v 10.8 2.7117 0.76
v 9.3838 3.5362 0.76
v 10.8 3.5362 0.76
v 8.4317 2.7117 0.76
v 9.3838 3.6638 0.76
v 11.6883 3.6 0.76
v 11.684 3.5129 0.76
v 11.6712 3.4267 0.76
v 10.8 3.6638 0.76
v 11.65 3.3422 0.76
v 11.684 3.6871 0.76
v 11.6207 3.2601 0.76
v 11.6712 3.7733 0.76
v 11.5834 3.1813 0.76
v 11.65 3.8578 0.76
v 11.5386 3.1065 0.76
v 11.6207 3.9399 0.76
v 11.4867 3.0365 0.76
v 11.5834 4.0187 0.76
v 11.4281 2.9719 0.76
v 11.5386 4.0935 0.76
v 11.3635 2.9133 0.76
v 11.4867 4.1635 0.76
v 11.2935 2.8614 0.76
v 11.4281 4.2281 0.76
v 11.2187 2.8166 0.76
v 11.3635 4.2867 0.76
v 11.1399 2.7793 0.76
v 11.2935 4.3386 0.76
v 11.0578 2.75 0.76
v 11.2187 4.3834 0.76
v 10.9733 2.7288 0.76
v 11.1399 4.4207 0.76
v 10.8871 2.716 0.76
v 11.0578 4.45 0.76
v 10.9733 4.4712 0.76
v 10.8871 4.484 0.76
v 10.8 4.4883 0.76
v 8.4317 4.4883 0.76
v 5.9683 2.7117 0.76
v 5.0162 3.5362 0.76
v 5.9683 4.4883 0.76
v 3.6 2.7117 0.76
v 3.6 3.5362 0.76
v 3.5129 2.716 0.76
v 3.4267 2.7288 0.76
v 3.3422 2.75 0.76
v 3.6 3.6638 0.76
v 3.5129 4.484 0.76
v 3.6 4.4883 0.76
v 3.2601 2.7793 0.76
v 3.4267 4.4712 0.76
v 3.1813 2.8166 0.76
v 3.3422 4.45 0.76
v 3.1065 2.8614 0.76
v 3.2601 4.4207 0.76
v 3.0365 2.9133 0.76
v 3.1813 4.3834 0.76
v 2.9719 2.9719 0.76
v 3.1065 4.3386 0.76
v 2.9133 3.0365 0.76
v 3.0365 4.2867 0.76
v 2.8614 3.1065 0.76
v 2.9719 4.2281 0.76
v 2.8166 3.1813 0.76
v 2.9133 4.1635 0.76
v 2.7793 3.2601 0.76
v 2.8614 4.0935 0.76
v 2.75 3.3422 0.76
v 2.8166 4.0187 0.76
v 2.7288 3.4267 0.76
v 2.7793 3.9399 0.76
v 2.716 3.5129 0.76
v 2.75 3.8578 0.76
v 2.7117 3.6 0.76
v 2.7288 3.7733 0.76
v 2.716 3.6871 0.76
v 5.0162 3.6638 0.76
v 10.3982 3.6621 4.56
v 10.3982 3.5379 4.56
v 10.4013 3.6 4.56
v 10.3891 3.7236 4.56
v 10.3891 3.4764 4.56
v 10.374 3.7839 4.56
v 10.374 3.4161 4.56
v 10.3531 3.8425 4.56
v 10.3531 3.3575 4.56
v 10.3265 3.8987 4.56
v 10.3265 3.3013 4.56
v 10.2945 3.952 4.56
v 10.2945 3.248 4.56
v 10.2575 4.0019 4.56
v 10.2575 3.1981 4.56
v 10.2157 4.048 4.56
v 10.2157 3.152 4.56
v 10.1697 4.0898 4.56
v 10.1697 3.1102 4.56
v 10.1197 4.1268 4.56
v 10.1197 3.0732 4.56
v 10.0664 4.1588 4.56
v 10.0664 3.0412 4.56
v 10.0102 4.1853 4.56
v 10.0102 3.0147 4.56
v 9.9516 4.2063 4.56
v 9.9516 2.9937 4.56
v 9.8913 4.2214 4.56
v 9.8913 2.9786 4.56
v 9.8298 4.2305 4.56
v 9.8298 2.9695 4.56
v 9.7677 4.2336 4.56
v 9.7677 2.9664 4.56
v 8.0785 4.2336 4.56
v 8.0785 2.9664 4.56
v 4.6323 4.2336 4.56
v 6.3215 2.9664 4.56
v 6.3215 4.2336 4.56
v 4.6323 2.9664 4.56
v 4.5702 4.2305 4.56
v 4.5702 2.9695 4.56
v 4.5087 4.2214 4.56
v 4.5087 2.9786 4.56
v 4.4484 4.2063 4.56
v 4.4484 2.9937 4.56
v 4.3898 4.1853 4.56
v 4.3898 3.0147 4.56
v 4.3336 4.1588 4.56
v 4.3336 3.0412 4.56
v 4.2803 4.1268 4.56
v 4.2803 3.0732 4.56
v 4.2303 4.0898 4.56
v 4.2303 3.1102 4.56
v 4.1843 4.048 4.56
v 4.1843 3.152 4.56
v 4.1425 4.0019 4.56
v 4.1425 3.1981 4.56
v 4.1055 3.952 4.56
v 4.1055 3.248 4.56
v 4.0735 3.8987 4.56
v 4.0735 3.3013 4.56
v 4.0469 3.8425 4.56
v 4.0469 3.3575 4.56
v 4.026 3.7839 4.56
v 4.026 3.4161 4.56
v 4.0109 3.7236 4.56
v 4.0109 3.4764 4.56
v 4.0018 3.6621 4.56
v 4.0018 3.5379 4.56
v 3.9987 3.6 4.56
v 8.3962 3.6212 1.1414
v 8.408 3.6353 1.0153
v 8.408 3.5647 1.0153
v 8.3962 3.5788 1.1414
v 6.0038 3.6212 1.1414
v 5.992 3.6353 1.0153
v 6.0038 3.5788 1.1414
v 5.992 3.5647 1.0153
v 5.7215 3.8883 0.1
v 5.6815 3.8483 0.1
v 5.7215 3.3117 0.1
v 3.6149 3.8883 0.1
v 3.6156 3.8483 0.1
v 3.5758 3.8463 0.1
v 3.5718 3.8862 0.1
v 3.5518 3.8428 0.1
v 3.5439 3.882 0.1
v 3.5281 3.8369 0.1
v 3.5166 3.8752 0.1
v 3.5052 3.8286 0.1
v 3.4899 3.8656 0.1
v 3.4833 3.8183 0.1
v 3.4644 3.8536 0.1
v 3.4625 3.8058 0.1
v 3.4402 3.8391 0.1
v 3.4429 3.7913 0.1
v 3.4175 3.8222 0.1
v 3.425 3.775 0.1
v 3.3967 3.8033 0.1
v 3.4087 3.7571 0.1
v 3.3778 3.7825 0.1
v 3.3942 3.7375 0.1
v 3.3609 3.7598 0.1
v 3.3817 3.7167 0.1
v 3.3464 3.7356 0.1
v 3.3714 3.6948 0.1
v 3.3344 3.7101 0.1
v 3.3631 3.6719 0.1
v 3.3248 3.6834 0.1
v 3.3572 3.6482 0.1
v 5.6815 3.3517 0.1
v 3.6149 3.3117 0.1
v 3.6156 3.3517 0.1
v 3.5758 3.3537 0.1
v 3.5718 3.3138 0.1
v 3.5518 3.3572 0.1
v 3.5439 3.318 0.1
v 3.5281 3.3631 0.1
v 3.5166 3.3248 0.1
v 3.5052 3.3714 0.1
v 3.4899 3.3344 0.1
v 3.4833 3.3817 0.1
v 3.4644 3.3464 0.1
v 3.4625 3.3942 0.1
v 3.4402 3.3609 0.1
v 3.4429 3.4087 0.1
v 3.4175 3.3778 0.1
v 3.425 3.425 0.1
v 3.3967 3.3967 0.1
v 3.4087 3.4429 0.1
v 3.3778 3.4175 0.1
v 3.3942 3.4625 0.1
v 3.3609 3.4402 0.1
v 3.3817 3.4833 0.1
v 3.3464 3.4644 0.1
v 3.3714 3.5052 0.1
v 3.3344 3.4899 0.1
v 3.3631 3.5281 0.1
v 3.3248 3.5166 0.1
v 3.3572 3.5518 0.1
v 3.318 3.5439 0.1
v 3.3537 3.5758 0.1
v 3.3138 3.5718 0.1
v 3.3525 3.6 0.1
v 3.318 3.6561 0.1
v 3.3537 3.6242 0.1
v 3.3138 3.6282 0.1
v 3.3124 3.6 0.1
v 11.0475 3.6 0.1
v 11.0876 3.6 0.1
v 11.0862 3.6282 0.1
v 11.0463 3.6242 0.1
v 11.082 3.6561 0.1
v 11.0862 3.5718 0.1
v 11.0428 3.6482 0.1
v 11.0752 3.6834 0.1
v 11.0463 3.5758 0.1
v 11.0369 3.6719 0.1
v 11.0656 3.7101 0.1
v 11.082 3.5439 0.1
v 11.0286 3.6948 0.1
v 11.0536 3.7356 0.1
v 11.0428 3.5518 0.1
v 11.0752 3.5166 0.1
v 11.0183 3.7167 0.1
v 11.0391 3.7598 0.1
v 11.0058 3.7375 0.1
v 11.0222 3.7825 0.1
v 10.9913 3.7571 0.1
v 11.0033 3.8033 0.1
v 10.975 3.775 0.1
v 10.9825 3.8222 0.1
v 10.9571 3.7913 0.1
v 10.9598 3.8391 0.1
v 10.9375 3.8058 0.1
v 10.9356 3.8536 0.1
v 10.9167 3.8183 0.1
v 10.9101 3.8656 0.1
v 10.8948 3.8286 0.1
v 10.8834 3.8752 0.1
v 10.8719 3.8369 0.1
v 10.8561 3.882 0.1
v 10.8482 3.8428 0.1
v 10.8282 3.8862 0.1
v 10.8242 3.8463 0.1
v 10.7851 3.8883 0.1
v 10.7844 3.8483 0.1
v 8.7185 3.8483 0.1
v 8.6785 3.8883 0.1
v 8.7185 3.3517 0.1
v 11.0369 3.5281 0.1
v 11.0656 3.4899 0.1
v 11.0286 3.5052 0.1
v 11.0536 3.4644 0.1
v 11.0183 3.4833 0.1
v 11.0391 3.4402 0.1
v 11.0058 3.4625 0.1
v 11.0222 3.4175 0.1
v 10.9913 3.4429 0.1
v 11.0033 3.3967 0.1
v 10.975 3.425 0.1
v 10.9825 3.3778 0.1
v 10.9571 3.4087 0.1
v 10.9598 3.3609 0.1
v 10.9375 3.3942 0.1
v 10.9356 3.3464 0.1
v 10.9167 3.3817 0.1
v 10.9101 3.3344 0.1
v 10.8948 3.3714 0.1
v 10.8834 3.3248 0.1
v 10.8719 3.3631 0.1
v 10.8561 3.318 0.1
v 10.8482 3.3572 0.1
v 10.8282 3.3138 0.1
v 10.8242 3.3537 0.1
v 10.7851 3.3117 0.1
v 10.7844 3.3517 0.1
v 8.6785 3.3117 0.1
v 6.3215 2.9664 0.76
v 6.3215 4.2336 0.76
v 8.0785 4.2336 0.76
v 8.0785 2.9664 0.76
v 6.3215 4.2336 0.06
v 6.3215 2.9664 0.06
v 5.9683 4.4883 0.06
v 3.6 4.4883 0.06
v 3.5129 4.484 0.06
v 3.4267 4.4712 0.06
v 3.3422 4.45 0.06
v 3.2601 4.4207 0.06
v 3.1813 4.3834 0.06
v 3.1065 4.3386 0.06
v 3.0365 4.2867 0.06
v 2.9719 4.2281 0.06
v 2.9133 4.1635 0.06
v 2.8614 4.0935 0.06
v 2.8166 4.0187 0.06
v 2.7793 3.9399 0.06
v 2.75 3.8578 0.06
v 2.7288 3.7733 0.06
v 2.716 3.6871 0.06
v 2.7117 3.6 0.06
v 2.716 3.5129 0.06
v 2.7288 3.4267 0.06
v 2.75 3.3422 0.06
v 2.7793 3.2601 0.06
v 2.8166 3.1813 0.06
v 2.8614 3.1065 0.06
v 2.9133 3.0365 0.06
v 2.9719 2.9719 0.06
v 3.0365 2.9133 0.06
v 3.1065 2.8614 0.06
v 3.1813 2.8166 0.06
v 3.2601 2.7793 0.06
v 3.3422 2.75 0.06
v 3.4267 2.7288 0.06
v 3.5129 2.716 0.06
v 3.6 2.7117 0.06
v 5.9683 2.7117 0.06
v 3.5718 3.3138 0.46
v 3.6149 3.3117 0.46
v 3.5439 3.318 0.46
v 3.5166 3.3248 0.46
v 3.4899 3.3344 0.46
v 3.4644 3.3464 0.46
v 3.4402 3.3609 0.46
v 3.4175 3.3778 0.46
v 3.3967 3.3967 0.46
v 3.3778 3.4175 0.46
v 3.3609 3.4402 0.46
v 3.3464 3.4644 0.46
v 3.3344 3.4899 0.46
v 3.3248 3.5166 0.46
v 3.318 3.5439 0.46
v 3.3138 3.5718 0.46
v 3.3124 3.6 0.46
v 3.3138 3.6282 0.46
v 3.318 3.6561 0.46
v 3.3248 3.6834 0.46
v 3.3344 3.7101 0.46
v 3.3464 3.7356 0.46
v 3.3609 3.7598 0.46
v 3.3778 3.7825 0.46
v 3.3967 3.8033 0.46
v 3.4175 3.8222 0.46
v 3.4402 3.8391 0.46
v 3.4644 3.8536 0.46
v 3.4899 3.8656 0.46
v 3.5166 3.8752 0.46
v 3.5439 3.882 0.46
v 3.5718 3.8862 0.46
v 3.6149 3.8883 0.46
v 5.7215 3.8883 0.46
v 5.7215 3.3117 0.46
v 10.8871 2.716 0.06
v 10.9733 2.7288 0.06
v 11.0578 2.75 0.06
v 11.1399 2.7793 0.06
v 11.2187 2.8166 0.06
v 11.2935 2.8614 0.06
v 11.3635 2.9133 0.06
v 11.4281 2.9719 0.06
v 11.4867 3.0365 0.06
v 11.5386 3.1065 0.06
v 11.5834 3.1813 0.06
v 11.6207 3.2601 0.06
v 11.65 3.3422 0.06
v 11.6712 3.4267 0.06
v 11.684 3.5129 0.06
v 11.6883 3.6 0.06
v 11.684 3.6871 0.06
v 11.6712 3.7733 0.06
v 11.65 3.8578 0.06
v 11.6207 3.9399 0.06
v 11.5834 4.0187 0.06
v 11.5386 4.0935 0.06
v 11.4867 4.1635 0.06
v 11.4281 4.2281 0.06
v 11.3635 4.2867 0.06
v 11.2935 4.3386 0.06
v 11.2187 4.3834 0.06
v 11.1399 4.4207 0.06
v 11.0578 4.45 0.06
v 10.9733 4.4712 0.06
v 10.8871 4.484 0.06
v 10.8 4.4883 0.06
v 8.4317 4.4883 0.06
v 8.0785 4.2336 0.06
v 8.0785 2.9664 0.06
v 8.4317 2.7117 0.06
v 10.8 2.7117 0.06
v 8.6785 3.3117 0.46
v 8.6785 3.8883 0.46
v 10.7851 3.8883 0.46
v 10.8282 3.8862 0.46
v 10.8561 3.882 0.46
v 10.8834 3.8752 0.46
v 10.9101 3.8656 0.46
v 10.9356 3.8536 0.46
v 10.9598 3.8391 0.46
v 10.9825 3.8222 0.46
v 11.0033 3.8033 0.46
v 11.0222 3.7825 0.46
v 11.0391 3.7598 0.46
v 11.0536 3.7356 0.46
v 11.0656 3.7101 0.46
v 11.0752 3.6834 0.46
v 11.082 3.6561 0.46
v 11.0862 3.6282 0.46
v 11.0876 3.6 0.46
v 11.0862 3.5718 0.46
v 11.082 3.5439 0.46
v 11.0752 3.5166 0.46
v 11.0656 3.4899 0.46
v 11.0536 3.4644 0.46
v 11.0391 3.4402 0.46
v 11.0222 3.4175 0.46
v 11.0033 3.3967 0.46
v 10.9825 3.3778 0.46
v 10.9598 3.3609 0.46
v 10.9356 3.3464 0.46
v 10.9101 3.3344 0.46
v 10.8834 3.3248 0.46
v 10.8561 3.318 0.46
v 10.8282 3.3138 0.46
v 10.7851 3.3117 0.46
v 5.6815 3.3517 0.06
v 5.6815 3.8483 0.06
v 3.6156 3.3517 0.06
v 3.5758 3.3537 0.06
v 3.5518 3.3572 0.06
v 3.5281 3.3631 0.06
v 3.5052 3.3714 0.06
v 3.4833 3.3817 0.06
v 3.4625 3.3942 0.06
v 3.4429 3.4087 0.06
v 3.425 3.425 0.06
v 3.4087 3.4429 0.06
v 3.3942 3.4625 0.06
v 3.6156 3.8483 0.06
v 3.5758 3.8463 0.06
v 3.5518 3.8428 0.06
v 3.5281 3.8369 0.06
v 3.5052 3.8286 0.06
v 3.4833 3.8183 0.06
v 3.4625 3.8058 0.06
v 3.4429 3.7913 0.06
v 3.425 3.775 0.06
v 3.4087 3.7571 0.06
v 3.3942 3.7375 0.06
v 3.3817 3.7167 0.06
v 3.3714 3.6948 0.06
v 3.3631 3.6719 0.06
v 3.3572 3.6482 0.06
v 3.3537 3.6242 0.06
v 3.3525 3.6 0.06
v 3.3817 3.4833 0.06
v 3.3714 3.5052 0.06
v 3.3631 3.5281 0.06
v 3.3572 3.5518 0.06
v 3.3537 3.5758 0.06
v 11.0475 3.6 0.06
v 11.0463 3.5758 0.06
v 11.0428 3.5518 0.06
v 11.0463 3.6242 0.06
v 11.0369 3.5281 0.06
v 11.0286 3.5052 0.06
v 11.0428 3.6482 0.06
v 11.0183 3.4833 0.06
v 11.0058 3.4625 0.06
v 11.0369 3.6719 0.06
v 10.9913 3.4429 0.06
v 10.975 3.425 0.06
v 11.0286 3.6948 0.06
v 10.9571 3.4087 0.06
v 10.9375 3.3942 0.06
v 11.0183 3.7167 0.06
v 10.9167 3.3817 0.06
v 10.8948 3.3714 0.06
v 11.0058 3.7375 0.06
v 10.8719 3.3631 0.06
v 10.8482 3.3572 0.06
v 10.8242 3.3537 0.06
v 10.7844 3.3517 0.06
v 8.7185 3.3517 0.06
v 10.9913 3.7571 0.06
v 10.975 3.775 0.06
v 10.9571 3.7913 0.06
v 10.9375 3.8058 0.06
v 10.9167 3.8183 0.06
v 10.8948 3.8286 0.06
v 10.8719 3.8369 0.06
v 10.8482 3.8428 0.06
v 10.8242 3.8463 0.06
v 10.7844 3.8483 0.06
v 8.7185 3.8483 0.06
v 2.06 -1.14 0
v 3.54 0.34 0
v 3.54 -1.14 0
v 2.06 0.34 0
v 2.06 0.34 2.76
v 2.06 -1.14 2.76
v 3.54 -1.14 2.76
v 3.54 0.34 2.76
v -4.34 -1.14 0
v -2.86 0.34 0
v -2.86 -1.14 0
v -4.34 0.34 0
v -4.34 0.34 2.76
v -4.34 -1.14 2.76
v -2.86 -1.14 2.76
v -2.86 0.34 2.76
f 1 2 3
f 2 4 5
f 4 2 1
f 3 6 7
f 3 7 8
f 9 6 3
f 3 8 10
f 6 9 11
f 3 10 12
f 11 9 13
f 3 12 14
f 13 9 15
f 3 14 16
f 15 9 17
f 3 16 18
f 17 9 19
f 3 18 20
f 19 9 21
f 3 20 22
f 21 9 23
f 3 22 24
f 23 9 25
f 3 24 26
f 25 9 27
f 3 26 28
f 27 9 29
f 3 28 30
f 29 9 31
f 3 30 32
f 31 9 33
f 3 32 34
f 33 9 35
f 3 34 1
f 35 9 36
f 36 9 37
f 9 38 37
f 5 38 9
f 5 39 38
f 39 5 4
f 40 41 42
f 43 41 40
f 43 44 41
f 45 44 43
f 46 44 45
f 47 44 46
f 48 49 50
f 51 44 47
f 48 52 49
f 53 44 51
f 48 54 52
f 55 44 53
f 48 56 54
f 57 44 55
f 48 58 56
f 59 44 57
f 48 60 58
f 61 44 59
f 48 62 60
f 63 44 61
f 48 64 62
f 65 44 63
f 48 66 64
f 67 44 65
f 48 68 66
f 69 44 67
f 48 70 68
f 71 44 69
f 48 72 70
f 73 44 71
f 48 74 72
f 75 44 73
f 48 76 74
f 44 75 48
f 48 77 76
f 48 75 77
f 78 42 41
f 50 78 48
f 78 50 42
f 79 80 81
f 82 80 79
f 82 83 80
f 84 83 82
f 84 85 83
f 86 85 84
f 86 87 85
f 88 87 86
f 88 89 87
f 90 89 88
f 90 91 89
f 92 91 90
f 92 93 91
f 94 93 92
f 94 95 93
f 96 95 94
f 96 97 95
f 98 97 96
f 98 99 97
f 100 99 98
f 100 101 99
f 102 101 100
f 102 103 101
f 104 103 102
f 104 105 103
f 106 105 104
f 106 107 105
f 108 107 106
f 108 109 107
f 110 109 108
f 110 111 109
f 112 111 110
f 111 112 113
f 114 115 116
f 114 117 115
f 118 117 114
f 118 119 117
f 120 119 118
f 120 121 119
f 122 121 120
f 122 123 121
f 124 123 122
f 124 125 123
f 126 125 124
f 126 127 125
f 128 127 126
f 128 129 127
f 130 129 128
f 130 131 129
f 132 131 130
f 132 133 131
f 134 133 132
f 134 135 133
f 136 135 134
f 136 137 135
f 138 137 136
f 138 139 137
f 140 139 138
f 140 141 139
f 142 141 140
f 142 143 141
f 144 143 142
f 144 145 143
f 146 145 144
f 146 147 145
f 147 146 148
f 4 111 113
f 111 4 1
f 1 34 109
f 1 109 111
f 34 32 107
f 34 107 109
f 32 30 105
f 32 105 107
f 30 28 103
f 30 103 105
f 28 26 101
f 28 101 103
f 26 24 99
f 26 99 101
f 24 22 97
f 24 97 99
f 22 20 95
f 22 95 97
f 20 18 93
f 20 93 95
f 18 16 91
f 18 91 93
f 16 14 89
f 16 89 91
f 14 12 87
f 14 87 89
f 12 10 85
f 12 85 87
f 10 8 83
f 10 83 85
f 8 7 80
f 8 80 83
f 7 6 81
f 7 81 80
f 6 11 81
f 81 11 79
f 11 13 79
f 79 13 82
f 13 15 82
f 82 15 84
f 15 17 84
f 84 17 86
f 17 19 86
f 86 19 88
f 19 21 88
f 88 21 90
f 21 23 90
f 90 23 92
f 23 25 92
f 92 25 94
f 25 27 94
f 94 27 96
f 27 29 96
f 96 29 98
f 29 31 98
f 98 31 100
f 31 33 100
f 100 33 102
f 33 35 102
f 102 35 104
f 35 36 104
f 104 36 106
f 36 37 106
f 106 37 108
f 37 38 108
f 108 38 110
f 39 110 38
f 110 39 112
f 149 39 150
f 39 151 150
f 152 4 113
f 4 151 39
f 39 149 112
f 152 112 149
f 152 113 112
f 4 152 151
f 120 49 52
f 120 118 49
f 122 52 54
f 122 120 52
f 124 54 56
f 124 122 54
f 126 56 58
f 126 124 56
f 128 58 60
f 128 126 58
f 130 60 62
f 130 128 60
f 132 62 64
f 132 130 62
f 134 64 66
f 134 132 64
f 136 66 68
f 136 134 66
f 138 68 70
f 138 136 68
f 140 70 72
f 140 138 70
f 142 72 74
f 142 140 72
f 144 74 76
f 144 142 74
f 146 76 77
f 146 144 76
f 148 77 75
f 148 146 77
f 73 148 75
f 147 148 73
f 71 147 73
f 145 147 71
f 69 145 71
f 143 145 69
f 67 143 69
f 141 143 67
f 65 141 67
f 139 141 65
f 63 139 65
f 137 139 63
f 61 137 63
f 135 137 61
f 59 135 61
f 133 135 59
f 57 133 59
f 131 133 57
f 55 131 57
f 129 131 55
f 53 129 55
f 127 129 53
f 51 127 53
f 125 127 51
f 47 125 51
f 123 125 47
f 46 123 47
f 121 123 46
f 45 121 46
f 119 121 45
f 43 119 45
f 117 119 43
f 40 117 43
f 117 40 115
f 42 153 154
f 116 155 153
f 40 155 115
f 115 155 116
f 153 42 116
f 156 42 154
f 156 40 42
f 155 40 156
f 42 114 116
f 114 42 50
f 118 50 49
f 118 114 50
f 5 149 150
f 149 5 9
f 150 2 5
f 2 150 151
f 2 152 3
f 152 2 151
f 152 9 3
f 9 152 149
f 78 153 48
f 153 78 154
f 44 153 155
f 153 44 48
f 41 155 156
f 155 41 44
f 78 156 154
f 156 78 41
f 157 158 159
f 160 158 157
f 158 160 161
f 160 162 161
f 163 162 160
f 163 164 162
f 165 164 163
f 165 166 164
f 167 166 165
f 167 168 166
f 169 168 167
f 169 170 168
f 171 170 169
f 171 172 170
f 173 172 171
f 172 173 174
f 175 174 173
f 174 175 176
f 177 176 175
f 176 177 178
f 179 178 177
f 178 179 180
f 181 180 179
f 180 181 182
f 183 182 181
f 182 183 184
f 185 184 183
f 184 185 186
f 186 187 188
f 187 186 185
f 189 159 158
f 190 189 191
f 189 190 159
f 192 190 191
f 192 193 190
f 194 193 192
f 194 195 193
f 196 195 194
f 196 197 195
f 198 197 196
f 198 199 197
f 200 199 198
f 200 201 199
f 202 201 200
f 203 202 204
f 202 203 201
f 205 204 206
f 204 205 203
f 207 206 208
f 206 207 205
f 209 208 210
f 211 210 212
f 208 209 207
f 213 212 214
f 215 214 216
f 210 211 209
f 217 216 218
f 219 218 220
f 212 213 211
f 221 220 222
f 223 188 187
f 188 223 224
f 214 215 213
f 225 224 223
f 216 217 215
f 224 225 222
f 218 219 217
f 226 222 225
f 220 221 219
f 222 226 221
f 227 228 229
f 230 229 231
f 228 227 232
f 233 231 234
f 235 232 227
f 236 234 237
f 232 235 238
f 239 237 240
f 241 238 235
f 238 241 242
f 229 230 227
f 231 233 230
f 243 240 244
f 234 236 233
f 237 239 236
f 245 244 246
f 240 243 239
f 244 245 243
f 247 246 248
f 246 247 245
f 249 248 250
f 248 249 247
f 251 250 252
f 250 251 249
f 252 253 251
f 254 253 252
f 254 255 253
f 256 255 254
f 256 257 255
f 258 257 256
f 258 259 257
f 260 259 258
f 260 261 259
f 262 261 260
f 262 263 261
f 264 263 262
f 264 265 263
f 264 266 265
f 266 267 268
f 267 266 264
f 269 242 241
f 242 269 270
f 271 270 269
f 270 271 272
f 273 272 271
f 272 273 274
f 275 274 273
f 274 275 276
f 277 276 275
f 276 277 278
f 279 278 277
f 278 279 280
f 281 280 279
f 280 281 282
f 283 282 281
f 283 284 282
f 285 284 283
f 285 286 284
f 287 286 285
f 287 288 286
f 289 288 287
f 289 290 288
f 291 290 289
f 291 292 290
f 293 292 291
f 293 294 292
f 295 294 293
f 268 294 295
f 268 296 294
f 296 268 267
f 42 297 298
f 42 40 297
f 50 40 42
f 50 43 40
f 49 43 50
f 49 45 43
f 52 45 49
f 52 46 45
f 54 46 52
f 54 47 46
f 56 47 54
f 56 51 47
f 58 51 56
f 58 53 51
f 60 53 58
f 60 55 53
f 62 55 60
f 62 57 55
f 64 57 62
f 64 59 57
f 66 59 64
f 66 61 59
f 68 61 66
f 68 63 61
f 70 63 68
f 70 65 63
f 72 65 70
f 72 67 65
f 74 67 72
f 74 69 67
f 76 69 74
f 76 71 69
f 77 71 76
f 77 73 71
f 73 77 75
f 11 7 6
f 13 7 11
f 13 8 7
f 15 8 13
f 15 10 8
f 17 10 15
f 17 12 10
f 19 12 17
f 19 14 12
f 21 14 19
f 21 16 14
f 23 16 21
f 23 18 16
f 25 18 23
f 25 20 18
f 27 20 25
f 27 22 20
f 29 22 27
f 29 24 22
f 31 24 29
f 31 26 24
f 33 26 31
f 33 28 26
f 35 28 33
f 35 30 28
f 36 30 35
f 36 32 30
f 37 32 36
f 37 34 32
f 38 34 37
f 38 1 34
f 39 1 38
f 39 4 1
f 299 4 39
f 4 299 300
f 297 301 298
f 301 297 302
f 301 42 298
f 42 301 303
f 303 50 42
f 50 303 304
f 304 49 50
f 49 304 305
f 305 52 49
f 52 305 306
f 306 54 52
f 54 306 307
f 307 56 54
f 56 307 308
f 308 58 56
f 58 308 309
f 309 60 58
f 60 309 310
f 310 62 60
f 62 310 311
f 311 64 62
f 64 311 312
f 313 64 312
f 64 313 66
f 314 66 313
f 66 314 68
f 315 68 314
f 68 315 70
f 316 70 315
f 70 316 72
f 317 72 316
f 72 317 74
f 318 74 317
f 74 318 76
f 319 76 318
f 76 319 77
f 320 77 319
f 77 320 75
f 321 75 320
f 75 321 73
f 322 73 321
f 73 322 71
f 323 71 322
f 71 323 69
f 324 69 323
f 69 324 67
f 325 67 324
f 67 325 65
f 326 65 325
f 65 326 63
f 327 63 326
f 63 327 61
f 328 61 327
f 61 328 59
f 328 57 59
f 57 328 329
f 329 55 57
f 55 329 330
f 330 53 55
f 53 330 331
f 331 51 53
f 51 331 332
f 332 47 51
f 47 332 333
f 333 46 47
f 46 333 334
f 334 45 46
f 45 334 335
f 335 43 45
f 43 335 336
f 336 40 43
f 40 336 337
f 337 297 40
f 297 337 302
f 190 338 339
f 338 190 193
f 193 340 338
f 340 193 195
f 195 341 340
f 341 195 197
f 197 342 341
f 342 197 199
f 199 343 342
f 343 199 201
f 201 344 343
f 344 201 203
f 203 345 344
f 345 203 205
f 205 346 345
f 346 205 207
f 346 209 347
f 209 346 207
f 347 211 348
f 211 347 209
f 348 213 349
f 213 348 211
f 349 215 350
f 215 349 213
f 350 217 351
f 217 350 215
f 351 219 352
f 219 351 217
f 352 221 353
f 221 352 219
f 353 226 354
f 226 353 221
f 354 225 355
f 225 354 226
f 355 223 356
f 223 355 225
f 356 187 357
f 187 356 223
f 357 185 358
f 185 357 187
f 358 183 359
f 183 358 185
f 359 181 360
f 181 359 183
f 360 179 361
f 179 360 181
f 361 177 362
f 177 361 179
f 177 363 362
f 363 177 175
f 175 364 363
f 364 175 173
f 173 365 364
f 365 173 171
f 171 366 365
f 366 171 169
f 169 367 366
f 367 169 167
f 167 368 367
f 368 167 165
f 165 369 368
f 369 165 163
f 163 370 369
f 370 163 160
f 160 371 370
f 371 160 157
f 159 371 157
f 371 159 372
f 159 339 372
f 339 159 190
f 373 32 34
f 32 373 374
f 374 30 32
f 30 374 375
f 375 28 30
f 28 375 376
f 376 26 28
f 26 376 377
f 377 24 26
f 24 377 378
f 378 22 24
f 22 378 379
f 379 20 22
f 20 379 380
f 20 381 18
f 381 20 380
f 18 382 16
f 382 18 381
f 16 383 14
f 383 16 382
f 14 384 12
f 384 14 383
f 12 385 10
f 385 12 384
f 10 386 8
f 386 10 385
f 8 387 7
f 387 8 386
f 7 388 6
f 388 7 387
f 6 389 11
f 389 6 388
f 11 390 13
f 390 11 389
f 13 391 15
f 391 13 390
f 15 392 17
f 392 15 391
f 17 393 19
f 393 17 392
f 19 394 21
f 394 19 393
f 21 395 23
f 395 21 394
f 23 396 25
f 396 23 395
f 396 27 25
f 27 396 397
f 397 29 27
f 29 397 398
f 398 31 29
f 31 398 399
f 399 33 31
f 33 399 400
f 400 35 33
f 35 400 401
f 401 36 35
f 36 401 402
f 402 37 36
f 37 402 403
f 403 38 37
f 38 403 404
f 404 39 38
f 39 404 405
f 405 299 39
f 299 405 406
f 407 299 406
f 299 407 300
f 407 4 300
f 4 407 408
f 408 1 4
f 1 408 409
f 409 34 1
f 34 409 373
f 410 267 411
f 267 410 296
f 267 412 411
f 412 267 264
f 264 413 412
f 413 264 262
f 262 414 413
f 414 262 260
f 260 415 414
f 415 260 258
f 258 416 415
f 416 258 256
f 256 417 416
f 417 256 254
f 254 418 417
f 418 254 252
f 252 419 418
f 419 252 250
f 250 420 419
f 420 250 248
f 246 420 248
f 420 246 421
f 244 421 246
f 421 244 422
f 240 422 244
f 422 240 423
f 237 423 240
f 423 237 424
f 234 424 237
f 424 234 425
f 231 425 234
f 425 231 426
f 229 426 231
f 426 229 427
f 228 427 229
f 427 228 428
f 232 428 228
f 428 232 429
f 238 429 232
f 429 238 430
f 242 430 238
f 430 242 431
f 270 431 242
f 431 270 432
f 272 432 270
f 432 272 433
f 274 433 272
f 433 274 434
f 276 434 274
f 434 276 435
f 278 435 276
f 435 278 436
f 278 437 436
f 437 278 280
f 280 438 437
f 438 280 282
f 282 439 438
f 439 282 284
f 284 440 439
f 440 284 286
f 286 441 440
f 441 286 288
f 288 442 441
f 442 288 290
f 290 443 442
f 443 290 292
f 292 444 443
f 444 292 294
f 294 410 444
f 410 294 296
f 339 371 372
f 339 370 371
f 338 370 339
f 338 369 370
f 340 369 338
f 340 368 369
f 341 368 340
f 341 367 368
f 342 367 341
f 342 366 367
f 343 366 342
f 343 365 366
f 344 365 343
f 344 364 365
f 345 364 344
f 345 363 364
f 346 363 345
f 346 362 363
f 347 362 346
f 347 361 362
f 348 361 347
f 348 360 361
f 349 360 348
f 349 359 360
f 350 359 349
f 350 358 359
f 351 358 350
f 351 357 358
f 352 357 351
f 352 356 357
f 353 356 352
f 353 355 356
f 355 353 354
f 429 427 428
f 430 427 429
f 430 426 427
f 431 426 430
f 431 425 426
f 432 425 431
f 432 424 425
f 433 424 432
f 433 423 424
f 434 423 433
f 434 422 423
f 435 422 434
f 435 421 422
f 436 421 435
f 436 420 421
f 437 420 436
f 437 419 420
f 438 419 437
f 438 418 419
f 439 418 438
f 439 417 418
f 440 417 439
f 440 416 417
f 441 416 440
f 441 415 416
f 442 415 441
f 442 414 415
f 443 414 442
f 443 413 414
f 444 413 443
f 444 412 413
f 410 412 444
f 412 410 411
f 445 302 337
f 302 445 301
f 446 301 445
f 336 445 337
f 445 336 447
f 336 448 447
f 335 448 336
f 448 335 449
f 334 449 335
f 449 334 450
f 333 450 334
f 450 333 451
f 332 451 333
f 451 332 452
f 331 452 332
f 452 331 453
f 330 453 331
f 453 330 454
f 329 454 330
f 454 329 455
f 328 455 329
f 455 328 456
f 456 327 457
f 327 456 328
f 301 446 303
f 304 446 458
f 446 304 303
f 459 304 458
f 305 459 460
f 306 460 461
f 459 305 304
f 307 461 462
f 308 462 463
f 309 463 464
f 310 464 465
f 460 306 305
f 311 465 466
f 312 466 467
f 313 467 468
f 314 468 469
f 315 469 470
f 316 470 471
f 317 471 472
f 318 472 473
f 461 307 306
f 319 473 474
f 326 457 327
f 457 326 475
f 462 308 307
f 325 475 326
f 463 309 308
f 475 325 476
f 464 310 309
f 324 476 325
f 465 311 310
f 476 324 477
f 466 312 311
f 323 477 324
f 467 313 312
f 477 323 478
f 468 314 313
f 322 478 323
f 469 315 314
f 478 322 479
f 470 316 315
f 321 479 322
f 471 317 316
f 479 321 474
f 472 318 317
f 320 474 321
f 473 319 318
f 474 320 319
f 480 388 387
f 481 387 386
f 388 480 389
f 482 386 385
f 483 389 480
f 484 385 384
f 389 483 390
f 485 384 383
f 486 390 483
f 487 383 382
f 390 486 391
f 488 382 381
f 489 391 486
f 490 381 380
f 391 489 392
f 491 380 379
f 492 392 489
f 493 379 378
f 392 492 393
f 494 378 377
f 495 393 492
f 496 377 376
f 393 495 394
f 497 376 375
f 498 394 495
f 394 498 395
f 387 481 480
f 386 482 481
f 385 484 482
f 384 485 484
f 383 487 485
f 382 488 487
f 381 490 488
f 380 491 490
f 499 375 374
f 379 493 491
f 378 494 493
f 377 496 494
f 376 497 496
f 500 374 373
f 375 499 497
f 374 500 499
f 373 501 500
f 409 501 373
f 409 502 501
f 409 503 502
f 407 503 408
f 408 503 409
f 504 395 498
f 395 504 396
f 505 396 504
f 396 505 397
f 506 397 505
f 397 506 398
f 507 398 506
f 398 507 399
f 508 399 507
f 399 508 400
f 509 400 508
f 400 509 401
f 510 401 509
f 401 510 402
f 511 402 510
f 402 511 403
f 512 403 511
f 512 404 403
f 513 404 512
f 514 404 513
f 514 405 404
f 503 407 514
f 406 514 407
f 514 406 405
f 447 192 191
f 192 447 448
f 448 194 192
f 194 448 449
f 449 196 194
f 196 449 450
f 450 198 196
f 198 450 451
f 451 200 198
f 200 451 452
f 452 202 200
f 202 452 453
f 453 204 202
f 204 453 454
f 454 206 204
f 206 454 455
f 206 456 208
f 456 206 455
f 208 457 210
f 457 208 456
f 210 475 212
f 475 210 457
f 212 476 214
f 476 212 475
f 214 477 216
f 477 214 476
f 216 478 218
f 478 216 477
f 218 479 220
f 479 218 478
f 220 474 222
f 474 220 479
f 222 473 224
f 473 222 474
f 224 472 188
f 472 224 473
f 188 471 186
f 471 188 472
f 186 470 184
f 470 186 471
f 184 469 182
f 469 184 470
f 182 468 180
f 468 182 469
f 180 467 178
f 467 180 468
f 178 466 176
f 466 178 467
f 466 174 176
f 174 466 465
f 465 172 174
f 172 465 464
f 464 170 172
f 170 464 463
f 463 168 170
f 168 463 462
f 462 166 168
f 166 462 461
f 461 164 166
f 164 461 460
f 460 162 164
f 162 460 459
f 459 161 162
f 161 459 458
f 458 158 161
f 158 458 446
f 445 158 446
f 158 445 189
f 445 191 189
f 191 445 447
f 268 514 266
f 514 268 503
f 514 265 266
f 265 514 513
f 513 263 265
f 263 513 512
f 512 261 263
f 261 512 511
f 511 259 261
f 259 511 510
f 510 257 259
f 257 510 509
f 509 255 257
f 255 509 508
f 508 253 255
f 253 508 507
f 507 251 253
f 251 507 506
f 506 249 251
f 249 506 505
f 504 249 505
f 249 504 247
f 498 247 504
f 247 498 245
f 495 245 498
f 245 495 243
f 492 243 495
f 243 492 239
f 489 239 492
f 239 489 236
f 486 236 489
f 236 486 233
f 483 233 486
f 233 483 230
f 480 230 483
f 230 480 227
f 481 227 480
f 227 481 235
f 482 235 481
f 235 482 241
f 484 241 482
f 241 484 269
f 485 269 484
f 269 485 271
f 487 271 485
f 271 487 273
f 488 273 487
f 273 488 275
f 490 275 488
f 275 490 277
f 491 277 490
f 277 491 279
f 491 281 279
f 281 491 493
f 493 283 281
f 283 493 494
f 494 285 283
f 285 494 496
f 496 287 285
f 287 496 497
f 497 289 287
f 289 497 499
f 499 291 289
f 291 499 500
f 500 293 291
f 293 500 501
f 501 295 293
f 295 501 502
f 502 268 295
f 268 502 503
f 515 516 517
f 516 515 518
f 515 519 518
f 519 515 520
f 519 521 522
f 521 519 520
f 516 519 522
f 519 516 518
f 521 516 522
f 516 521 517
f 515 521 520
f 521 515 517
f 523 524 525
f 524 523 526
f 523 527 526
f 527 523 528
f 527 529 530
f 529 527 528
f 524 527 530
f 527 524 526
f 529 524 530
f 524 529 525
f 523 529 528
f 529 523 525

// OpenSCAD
// Generated by SolidPython 1.1.3 on 2025-10-21 00:44:24


scale(v = [0.8000000000, 0.8000000000, 1]) {
	union() {
		translate(v = [0, 0, 0.7600000000]) {
			union() {
				translate(v = [9.0000000000, 4.5000000000, 0.0000000000]) {
					difference() {
						linear_extrude(height = 3.8000000000, scale = 0.7132546142) {
							union() {
								union() {
									translate(v = [4.5000000000, 0]) {
										circle($fn = 64, r = 1.1103675341);
									}
									translate(v = [-4.5000000000, 0]) {
										circle($fn = 64, r = 1.1103675341);
									}
								}
								union() {
									translate(v = [3.0198162329, 0]) {
										square(center = true, size = [2.9603675341, 2.2207350682]);
									}
									translate(v = [-3.0198162329, 0]) {
										square(center = true, size = [2.9603675341, 2.2207350682]);
									}
								}
							}
						}
						linear_extrude(height = 0.4000000000, scale = 0.2997924618) {
							union() {
								union() {
									translate(v = [4.5000000000, 0]) {
										circle($fn = 64, r = -0.0797154812);
									}
									translate(v = [-4.5000000000, 0]) {
										circle($fn = 64, r = -0.0797154812);
									}
								}
								union() {
									translate(v = [3.6148577406, 0]) {
										square(center = true, size = [1.7702845188, 0.1594309623]);
									}
									translate(v = [-3.6148577406, 0]) {
										square(center = true, size = [1.7702845188, 0.1594309623]);
									}
								}
							}
						}
					}
				}
			}
		}
		translate(v = [0, 0, 0.0400000000]) {
			union() {
				union() {
					translate(v = [0, 0, 0.0600000000]) {
						linear_extrude(height = 0.6600000000) {
							difference() {
								projection() {
									translate(v = [0, 0, 0.7600000000]) {
										union() {
											translate(v = [9.0000000000, 4.5000000000, 0.0000000000]) {
												difference() {
													linear_extrude(height = 3.8000000000, scale = 0.7132546142) {
														union() {
															union() {
																translate(v = [4.5000000000, 0]) {
																	circle($fn = 64, r = 1.1103675341);
																}
																translate(v = [-4.5000000000, 0]) {
																	circle($fn = 64, r = 1.1103675341);
																}
															}
															union() {
																translate(v = [3.0198162329, 0]) {
																	square(center = true, size = [2.9603675341, 2.2207350682]);
																}
																translate(v = [-3.0198162329, 0]) {
																	square(center = true, size = [2.9603675341, 2.2207350682]);
																}
															}
														}
													}
													linear_extrude(height = 0.4000000000, scale = 0.2997924618) {
														union() {
															union() {
																translate(v = [4.5000000000, 0]) {
																	circle($fn = 64, r = -0.0797154812);
																}
																translate(v = [-4.5000000000, 0]) {
																	circle($fn = 64, r = -0.0797154812);
																}
															}
															union() {
																translate(v = [3.6148577406, 0]) {
																	square(center = true, size = [1.7702845188, 0.1594309623]);
																}
																translate(v = [-3.6148577406, 0]) {
																	square(center = true, size = [1.7702845188, 0.1594309623]);
																}
															}
														}
													}
												}
											}
										}
									}
								}
								offset(chamfer = false, delta = -0.7500000000) {
									projection() {
										translate(v = [0, 0, 0.7600000000]) {
											union() {
												translate(v = [9.0000000000, 4.5000000000, 0.0000000000]) {
													difference() {
														linear_extrude(height = 3.8000000000, scale = 0.7132546142) {
															union() {
																union() {
																	translate(v = [4.5000000000, 0]) {
																		circle($fn = 64, r = 1.1103675341);
																	}
																	translate(v = [-4.5000000000, 0]) {
																		circle($fn = 64, r = 1.1103675341);
																	}
																}
																union() {
																	translate(v = [3.0198162329, 0]) {
																		square(center = true, size = [2.9603675341, 2.2207350682]);
																	}
																	translate(v = [-3.0198162329, 0]) {
																		square(center = true, size = [2.9603675341, 2.2207350682]);
																	}
																}
															}
														}
														linear_extrude(height = 0.4000000000, scale = 0.2997924618) {
															union() {
																union() {
																	translate(v = [4.5000000000, 0]) {
																		circle($fn = 64, r = -0.0797154812);
																	}
																	translate(v = [-4.5000000000, 0]) {
																		circle($fn = 64, r = -0.0797154812);
																	}
																}
																union() {
																	translate(v = [3.6148577406, 0]) {
																		square(center = true, size = [1.7702845188, 0.1594309623]);
																	}
																	translate(v = [-3.6148577406, 0]) {
																		square(center = true, size = [1.7702845188, 0.1594309623]);
																	}
																}
															}
														}
													}
												}
											}
										}
									}
								}
							}
						}
					}
					translate(v = [0, 0, 0.4200000000]) {
						linear_extrude(height = 0.3000000000) {
							projection() {
								translate(v = [0, 0, 0.7600000000]) {
									union() {
										translate(v = [9.0000000000, 4.5000000000, 0.0000000000]) {
											difference() {
												linear_extrude(height = 3.8000000000, scale = 0.7132546142) {
													union() {
														union() {
															translate(v = [4.5000000000, 0]) {
																circle($fn = 64, r = 1.1103675341);
															}
															translate(v = [-4.5000000000, 0]) {
																circle($fn = 64, r = 1.1103675341);
															}
														}
														union() {
															translate(v = [3.0198162329, 0]) {
																square(center = true, size = [2.9603675341, 2.2207350682]);
															}
															translate(v = [-3.0198162329, 0]) {
																square(center = true, size = [2.9603675341, 2.2207350682]);
															}
														}
													}
												}
												linear_extrude(height = 0.4000000000, scale = 0.2997924618) {
													union() {
														union() {
															translate(v = [4.5000000000, 0]) {
																circle($fn = 64, r = -0.0797154812);
															}
															translate(v = [-4.5000000000, 0]) {
																circle($fn = 64, r = -0.0797154812);
															}
														}
														union() {
															translate(v = [3.6148577406, 0]) {
																square(center = true, size = [1.7702845188, 0.1594309623]);
															}
															translate(v = [-3.6148577406, 0]) {
																square(center = true, size = [1.7702845188, 0.1594309623]);
															}
														}
													}
												}
											}
										}
									}
								}
							}
						}
					}
				}
				translate(v = [0, 0, 0.0200000000]) {
					linear_extrude(height = 0.0400000000) {
						difference() {
							projection() {
								translate(v = [0, 0, 0.7600000000]) {
									union() {
										translate(v = [9.0000000000, 4.5000000000, 0.0000000000]) {
											difference() {
												linear_extrude(height = 3.8000000000, scale = 0.7132546142) {
													union() {
														union() {
															translate(v = [4.5000000000, 0]) {
																circle($fn = 64, r = 1.1103675341);
															}
															translate(v = [-4.5000000000, 0]) {
																circle($fn = 64, r = 1.1103675341);
															}
														}
														union() {
															translate(v = [3.0198162329, 0]) {
																square(center = true, size = [2.9603675341, 2.2207350682]);
															}
															translate(v = [-3.0198162329, 0]) {
																square(center = true, size = [2.9603675341, 2.2207350682]);
															}
														}
													}
												}
												linear_extrude(height = 0.4000000000, scale = 0.2997924618) {
													union() {
														union() {
															translate(v = [4.5000000000, 0]) {
																circle($fn = 64, r = -0.0797154812);
															}
															translate(v = [-4.5000000000, 0]) {
																circle($fn = 64, r = -0.0797154812);
															}
														}
														union() {
															translate(v = [3.6148577406, 0]) {
																square(center = true, size = [1.7702845188, 0.1594309623]);
															}
															translate(v = [-3.6148577406, 0]) {
																square(center = true, size = [1.7702845188, 0.1594309623]);
															}
														}
													}
												}
											}
										}
									}
								}
							}
							offset(chamfer = false, delta = -0.8000000000) {
								projection() {
									translate(v = [0, 0, 0.7600000000]) {
										union() {
											translate(v = [9.0000000000, 4.5000000000, 0.0000000000]) {
												difference() {
													linear_extrude(height = 3.8000000000, scale = 0.7132546142) {
														union() {
															union() {
																translate(v = [4.5000000000, 0]) {
																	circle($fn = 64, r = 1.1103675341);
																}
																translate(v = [-4.5000000000, 0]) {
																	circle($fn = 64, r = 1.1103675341);
																}
															}
															union() {
																translate(v = [3.0198162329, 0]) {
																	square(center = true, size = [2.9603675341, 2.2207350682]);
																}
																translate(v = [-3.0198162329, 0]) {
																	square(center = true, size = [2.9603675341, 2.2207350682]);
																}
															}
														}
													}
													linear_extrude(height = 0.4000000000, scale = 0.2997924618) {
														union() {
															union() {
																translate(v = [4.5000000000, 0]) {
																	circle($fn = 64, r = -0.0797154812);
																}
																translate(v = [-4.5000000000, 0]) {
																	circle($fn = 64, r = -0.0797154812);
																}
															}
															union() {
																translate(v = [3.6148577406, 0]) {
																	square(center = true, size = [1.7702845188, 0.1594309623]);
																}
																translate(v = [-3.6148577406, 0]) {
																	square(center = true, size = [1.7702845188, 0.1594309623]);
																}
															}
														}
													}
												}
											}
										}
									}
								}
							}
						}
					}
				}
			}
		}
		union() {
			translate(v = [3.5000000000, -0.5000000000, 0]) {
				linear_extrude(height = 2.7600000000) {
					square(center = true, size = [1.8500000000, 1.8500000000]);
				}
			}
			translate(v = [-4.5000000000, -0.5000000000, 0]) {
				linear_extrude(height = 2.7600000000) {
					square(center = true, size = [1.8500000000, 1.8500000000]);
				}
			}
		}
	}
}
/***********************************************
*********      SolidPython code:      **********
************************************************
 
#!/usr/bin/env python3
"""
Generate 3D printed well inserts for a single 2-compartment device.

This example generates inserts for just one device (2 wells) instead of a full
96-well array, making it much faster to load and preview in OpenSCAD.

Usage:
    python examples/inserts/single_device_insert.py
"""

from pathlib import Path
import solid

from openmfd.geometry import wells_pos_from_center_2, make_chambers
from openmfd.inserts.config import (
    TaperConfiguration,
    InsertConfiguration,
    PinConfiguration,
    SkirtConfiguration,
)
from openmfd.inserts.wells import assemble_well_inserts


def make_2_compartment_device(well_rad, chan_l, chamber_width, add_chambers):
    """Create a simple 2-compartment device for insert generation.

    This is a simplified version that just creates the chamber geometry
    needed for insert generation (no channels needed for inserts).
    """
    from openmfd.geometry import wells_top_bottom, make_channels

    # Well positions
    wells_pos = 4.5
    well_positions = wells_pos_from_center_2(wells_pos)

    # Create wells
    wells = wells_top_bottom(
        radius=well_rad,
        height=None,
        positions=well_positions,
        dxf=True,
        shape="circle"
    )

    if add_chambers:
        # Create channels to get measurements
        _, measurements = make_channels(
            length=chan_l,
            width=0.01,
            height=0.2,
            num_chans=int(well_rad / 0.04),
            spacing=0.03,
            dxf=True
        )

        # Create chambers
        chambers = make_chambers(
            msrs=measurements,
            height=0.2,
            width=chamber_width,
            len_until=wells_pos,
            dxf=True
        )

        geometry = solid.union()(wells, chambers)
    else:
        geometry = wells

    return (geometry, well_positions), None, None


def main():
    """Generate well inserts for a single 2-compartment device."""

    # Device parameters (from 2_compartment_96_well_v27)
    WELL_RAD = 5.0 / 2.0
    CHAN_L = 0.3
    CHAMBER_WIDTH = WELL_RAD * 2
    WELLS_POS = 4.5

    # Insert parameters
    INSERT_PIN_OFFSET = -0.5

    # Single device dimensions (no array)
    DIMS = [18, 9, 0]
    GRID_SIZE = [1, 1]

    # Well positions for pins
    well_positions = wells_pos_from_center_2(WELLS_POS + INSERT_PIN_OFFSET)

    # Configure outer taper (easier pipetting access)
    outer_taper = TaperConfiguration(
        height=3.8,
        degrees=16,
        extra_length=0.300,
        segments=20,
    )

    # Configure inner taper (liquid containment)
    inner_taper = TaperConfiguration(
        height=0.40,
        degrees=35,
        extra_length=0.91,
        segments=20,
    )

    # Configure well insert geometry
    insert_config = InsertConfiguration(
        outer_taper=outer_taper,
        inner_taper=inner_taper,
        well_radius=WELL_RAD,
        channel_length=CHAN_L,
    )

    # Configure alignment pins
    pin_config = PinConfiguration(
        dims=(1.85, 1.85),
        height=0.06,
        inner_height=2.0,
        offset=INSERT_PIN_OFFSET,
        hole_dims=(2.0, 2.0),
    )

    # Configure sealing skirts
    skirt_config = SkirtConfiguration(
        thickness1=0.75,
        height1=0.66,
        empty1=0.3,
        thickness2=0.8,
        height2=0.04,
    )

    # Generate the complete insert assembly
    print("Generating well inserts for single device (2 wells)...")
    insert_assembly = assemble_well_inserts(
        device_function=make_2_compartment_device,
        insert_config=insert_config,
        pin_config=pin_config,
        skirt_config=skirt_config,
        dims=DIMS,
        grid_size=GRID_SIZE,
        well_positions=well_positions,
        alignment_offset=None,
        pdms_scale=0.8,  # PDMS shrinkage compensation
    )

    # Export to SCAD file
    output_dir = Path("designs/inserts")
    output_dir.mkdir(parents=True, exist_ok=True)
    output_file = output_dir / "single_device_insert.scad"

    print(f"Writing to {output_file}...")
    solid.scad_render_to_file(insert_assembly, str(output_file))
    print(f"✓ Done! Open {output_file} in OpenSCAD to preview.")
    print("\nTo generate STL:")
    print(f"  openscad -o {output_dir}/single_device_insert.stl {output_file}")


if __name__ == "__main__":
    main()
 
 
************************************************/
